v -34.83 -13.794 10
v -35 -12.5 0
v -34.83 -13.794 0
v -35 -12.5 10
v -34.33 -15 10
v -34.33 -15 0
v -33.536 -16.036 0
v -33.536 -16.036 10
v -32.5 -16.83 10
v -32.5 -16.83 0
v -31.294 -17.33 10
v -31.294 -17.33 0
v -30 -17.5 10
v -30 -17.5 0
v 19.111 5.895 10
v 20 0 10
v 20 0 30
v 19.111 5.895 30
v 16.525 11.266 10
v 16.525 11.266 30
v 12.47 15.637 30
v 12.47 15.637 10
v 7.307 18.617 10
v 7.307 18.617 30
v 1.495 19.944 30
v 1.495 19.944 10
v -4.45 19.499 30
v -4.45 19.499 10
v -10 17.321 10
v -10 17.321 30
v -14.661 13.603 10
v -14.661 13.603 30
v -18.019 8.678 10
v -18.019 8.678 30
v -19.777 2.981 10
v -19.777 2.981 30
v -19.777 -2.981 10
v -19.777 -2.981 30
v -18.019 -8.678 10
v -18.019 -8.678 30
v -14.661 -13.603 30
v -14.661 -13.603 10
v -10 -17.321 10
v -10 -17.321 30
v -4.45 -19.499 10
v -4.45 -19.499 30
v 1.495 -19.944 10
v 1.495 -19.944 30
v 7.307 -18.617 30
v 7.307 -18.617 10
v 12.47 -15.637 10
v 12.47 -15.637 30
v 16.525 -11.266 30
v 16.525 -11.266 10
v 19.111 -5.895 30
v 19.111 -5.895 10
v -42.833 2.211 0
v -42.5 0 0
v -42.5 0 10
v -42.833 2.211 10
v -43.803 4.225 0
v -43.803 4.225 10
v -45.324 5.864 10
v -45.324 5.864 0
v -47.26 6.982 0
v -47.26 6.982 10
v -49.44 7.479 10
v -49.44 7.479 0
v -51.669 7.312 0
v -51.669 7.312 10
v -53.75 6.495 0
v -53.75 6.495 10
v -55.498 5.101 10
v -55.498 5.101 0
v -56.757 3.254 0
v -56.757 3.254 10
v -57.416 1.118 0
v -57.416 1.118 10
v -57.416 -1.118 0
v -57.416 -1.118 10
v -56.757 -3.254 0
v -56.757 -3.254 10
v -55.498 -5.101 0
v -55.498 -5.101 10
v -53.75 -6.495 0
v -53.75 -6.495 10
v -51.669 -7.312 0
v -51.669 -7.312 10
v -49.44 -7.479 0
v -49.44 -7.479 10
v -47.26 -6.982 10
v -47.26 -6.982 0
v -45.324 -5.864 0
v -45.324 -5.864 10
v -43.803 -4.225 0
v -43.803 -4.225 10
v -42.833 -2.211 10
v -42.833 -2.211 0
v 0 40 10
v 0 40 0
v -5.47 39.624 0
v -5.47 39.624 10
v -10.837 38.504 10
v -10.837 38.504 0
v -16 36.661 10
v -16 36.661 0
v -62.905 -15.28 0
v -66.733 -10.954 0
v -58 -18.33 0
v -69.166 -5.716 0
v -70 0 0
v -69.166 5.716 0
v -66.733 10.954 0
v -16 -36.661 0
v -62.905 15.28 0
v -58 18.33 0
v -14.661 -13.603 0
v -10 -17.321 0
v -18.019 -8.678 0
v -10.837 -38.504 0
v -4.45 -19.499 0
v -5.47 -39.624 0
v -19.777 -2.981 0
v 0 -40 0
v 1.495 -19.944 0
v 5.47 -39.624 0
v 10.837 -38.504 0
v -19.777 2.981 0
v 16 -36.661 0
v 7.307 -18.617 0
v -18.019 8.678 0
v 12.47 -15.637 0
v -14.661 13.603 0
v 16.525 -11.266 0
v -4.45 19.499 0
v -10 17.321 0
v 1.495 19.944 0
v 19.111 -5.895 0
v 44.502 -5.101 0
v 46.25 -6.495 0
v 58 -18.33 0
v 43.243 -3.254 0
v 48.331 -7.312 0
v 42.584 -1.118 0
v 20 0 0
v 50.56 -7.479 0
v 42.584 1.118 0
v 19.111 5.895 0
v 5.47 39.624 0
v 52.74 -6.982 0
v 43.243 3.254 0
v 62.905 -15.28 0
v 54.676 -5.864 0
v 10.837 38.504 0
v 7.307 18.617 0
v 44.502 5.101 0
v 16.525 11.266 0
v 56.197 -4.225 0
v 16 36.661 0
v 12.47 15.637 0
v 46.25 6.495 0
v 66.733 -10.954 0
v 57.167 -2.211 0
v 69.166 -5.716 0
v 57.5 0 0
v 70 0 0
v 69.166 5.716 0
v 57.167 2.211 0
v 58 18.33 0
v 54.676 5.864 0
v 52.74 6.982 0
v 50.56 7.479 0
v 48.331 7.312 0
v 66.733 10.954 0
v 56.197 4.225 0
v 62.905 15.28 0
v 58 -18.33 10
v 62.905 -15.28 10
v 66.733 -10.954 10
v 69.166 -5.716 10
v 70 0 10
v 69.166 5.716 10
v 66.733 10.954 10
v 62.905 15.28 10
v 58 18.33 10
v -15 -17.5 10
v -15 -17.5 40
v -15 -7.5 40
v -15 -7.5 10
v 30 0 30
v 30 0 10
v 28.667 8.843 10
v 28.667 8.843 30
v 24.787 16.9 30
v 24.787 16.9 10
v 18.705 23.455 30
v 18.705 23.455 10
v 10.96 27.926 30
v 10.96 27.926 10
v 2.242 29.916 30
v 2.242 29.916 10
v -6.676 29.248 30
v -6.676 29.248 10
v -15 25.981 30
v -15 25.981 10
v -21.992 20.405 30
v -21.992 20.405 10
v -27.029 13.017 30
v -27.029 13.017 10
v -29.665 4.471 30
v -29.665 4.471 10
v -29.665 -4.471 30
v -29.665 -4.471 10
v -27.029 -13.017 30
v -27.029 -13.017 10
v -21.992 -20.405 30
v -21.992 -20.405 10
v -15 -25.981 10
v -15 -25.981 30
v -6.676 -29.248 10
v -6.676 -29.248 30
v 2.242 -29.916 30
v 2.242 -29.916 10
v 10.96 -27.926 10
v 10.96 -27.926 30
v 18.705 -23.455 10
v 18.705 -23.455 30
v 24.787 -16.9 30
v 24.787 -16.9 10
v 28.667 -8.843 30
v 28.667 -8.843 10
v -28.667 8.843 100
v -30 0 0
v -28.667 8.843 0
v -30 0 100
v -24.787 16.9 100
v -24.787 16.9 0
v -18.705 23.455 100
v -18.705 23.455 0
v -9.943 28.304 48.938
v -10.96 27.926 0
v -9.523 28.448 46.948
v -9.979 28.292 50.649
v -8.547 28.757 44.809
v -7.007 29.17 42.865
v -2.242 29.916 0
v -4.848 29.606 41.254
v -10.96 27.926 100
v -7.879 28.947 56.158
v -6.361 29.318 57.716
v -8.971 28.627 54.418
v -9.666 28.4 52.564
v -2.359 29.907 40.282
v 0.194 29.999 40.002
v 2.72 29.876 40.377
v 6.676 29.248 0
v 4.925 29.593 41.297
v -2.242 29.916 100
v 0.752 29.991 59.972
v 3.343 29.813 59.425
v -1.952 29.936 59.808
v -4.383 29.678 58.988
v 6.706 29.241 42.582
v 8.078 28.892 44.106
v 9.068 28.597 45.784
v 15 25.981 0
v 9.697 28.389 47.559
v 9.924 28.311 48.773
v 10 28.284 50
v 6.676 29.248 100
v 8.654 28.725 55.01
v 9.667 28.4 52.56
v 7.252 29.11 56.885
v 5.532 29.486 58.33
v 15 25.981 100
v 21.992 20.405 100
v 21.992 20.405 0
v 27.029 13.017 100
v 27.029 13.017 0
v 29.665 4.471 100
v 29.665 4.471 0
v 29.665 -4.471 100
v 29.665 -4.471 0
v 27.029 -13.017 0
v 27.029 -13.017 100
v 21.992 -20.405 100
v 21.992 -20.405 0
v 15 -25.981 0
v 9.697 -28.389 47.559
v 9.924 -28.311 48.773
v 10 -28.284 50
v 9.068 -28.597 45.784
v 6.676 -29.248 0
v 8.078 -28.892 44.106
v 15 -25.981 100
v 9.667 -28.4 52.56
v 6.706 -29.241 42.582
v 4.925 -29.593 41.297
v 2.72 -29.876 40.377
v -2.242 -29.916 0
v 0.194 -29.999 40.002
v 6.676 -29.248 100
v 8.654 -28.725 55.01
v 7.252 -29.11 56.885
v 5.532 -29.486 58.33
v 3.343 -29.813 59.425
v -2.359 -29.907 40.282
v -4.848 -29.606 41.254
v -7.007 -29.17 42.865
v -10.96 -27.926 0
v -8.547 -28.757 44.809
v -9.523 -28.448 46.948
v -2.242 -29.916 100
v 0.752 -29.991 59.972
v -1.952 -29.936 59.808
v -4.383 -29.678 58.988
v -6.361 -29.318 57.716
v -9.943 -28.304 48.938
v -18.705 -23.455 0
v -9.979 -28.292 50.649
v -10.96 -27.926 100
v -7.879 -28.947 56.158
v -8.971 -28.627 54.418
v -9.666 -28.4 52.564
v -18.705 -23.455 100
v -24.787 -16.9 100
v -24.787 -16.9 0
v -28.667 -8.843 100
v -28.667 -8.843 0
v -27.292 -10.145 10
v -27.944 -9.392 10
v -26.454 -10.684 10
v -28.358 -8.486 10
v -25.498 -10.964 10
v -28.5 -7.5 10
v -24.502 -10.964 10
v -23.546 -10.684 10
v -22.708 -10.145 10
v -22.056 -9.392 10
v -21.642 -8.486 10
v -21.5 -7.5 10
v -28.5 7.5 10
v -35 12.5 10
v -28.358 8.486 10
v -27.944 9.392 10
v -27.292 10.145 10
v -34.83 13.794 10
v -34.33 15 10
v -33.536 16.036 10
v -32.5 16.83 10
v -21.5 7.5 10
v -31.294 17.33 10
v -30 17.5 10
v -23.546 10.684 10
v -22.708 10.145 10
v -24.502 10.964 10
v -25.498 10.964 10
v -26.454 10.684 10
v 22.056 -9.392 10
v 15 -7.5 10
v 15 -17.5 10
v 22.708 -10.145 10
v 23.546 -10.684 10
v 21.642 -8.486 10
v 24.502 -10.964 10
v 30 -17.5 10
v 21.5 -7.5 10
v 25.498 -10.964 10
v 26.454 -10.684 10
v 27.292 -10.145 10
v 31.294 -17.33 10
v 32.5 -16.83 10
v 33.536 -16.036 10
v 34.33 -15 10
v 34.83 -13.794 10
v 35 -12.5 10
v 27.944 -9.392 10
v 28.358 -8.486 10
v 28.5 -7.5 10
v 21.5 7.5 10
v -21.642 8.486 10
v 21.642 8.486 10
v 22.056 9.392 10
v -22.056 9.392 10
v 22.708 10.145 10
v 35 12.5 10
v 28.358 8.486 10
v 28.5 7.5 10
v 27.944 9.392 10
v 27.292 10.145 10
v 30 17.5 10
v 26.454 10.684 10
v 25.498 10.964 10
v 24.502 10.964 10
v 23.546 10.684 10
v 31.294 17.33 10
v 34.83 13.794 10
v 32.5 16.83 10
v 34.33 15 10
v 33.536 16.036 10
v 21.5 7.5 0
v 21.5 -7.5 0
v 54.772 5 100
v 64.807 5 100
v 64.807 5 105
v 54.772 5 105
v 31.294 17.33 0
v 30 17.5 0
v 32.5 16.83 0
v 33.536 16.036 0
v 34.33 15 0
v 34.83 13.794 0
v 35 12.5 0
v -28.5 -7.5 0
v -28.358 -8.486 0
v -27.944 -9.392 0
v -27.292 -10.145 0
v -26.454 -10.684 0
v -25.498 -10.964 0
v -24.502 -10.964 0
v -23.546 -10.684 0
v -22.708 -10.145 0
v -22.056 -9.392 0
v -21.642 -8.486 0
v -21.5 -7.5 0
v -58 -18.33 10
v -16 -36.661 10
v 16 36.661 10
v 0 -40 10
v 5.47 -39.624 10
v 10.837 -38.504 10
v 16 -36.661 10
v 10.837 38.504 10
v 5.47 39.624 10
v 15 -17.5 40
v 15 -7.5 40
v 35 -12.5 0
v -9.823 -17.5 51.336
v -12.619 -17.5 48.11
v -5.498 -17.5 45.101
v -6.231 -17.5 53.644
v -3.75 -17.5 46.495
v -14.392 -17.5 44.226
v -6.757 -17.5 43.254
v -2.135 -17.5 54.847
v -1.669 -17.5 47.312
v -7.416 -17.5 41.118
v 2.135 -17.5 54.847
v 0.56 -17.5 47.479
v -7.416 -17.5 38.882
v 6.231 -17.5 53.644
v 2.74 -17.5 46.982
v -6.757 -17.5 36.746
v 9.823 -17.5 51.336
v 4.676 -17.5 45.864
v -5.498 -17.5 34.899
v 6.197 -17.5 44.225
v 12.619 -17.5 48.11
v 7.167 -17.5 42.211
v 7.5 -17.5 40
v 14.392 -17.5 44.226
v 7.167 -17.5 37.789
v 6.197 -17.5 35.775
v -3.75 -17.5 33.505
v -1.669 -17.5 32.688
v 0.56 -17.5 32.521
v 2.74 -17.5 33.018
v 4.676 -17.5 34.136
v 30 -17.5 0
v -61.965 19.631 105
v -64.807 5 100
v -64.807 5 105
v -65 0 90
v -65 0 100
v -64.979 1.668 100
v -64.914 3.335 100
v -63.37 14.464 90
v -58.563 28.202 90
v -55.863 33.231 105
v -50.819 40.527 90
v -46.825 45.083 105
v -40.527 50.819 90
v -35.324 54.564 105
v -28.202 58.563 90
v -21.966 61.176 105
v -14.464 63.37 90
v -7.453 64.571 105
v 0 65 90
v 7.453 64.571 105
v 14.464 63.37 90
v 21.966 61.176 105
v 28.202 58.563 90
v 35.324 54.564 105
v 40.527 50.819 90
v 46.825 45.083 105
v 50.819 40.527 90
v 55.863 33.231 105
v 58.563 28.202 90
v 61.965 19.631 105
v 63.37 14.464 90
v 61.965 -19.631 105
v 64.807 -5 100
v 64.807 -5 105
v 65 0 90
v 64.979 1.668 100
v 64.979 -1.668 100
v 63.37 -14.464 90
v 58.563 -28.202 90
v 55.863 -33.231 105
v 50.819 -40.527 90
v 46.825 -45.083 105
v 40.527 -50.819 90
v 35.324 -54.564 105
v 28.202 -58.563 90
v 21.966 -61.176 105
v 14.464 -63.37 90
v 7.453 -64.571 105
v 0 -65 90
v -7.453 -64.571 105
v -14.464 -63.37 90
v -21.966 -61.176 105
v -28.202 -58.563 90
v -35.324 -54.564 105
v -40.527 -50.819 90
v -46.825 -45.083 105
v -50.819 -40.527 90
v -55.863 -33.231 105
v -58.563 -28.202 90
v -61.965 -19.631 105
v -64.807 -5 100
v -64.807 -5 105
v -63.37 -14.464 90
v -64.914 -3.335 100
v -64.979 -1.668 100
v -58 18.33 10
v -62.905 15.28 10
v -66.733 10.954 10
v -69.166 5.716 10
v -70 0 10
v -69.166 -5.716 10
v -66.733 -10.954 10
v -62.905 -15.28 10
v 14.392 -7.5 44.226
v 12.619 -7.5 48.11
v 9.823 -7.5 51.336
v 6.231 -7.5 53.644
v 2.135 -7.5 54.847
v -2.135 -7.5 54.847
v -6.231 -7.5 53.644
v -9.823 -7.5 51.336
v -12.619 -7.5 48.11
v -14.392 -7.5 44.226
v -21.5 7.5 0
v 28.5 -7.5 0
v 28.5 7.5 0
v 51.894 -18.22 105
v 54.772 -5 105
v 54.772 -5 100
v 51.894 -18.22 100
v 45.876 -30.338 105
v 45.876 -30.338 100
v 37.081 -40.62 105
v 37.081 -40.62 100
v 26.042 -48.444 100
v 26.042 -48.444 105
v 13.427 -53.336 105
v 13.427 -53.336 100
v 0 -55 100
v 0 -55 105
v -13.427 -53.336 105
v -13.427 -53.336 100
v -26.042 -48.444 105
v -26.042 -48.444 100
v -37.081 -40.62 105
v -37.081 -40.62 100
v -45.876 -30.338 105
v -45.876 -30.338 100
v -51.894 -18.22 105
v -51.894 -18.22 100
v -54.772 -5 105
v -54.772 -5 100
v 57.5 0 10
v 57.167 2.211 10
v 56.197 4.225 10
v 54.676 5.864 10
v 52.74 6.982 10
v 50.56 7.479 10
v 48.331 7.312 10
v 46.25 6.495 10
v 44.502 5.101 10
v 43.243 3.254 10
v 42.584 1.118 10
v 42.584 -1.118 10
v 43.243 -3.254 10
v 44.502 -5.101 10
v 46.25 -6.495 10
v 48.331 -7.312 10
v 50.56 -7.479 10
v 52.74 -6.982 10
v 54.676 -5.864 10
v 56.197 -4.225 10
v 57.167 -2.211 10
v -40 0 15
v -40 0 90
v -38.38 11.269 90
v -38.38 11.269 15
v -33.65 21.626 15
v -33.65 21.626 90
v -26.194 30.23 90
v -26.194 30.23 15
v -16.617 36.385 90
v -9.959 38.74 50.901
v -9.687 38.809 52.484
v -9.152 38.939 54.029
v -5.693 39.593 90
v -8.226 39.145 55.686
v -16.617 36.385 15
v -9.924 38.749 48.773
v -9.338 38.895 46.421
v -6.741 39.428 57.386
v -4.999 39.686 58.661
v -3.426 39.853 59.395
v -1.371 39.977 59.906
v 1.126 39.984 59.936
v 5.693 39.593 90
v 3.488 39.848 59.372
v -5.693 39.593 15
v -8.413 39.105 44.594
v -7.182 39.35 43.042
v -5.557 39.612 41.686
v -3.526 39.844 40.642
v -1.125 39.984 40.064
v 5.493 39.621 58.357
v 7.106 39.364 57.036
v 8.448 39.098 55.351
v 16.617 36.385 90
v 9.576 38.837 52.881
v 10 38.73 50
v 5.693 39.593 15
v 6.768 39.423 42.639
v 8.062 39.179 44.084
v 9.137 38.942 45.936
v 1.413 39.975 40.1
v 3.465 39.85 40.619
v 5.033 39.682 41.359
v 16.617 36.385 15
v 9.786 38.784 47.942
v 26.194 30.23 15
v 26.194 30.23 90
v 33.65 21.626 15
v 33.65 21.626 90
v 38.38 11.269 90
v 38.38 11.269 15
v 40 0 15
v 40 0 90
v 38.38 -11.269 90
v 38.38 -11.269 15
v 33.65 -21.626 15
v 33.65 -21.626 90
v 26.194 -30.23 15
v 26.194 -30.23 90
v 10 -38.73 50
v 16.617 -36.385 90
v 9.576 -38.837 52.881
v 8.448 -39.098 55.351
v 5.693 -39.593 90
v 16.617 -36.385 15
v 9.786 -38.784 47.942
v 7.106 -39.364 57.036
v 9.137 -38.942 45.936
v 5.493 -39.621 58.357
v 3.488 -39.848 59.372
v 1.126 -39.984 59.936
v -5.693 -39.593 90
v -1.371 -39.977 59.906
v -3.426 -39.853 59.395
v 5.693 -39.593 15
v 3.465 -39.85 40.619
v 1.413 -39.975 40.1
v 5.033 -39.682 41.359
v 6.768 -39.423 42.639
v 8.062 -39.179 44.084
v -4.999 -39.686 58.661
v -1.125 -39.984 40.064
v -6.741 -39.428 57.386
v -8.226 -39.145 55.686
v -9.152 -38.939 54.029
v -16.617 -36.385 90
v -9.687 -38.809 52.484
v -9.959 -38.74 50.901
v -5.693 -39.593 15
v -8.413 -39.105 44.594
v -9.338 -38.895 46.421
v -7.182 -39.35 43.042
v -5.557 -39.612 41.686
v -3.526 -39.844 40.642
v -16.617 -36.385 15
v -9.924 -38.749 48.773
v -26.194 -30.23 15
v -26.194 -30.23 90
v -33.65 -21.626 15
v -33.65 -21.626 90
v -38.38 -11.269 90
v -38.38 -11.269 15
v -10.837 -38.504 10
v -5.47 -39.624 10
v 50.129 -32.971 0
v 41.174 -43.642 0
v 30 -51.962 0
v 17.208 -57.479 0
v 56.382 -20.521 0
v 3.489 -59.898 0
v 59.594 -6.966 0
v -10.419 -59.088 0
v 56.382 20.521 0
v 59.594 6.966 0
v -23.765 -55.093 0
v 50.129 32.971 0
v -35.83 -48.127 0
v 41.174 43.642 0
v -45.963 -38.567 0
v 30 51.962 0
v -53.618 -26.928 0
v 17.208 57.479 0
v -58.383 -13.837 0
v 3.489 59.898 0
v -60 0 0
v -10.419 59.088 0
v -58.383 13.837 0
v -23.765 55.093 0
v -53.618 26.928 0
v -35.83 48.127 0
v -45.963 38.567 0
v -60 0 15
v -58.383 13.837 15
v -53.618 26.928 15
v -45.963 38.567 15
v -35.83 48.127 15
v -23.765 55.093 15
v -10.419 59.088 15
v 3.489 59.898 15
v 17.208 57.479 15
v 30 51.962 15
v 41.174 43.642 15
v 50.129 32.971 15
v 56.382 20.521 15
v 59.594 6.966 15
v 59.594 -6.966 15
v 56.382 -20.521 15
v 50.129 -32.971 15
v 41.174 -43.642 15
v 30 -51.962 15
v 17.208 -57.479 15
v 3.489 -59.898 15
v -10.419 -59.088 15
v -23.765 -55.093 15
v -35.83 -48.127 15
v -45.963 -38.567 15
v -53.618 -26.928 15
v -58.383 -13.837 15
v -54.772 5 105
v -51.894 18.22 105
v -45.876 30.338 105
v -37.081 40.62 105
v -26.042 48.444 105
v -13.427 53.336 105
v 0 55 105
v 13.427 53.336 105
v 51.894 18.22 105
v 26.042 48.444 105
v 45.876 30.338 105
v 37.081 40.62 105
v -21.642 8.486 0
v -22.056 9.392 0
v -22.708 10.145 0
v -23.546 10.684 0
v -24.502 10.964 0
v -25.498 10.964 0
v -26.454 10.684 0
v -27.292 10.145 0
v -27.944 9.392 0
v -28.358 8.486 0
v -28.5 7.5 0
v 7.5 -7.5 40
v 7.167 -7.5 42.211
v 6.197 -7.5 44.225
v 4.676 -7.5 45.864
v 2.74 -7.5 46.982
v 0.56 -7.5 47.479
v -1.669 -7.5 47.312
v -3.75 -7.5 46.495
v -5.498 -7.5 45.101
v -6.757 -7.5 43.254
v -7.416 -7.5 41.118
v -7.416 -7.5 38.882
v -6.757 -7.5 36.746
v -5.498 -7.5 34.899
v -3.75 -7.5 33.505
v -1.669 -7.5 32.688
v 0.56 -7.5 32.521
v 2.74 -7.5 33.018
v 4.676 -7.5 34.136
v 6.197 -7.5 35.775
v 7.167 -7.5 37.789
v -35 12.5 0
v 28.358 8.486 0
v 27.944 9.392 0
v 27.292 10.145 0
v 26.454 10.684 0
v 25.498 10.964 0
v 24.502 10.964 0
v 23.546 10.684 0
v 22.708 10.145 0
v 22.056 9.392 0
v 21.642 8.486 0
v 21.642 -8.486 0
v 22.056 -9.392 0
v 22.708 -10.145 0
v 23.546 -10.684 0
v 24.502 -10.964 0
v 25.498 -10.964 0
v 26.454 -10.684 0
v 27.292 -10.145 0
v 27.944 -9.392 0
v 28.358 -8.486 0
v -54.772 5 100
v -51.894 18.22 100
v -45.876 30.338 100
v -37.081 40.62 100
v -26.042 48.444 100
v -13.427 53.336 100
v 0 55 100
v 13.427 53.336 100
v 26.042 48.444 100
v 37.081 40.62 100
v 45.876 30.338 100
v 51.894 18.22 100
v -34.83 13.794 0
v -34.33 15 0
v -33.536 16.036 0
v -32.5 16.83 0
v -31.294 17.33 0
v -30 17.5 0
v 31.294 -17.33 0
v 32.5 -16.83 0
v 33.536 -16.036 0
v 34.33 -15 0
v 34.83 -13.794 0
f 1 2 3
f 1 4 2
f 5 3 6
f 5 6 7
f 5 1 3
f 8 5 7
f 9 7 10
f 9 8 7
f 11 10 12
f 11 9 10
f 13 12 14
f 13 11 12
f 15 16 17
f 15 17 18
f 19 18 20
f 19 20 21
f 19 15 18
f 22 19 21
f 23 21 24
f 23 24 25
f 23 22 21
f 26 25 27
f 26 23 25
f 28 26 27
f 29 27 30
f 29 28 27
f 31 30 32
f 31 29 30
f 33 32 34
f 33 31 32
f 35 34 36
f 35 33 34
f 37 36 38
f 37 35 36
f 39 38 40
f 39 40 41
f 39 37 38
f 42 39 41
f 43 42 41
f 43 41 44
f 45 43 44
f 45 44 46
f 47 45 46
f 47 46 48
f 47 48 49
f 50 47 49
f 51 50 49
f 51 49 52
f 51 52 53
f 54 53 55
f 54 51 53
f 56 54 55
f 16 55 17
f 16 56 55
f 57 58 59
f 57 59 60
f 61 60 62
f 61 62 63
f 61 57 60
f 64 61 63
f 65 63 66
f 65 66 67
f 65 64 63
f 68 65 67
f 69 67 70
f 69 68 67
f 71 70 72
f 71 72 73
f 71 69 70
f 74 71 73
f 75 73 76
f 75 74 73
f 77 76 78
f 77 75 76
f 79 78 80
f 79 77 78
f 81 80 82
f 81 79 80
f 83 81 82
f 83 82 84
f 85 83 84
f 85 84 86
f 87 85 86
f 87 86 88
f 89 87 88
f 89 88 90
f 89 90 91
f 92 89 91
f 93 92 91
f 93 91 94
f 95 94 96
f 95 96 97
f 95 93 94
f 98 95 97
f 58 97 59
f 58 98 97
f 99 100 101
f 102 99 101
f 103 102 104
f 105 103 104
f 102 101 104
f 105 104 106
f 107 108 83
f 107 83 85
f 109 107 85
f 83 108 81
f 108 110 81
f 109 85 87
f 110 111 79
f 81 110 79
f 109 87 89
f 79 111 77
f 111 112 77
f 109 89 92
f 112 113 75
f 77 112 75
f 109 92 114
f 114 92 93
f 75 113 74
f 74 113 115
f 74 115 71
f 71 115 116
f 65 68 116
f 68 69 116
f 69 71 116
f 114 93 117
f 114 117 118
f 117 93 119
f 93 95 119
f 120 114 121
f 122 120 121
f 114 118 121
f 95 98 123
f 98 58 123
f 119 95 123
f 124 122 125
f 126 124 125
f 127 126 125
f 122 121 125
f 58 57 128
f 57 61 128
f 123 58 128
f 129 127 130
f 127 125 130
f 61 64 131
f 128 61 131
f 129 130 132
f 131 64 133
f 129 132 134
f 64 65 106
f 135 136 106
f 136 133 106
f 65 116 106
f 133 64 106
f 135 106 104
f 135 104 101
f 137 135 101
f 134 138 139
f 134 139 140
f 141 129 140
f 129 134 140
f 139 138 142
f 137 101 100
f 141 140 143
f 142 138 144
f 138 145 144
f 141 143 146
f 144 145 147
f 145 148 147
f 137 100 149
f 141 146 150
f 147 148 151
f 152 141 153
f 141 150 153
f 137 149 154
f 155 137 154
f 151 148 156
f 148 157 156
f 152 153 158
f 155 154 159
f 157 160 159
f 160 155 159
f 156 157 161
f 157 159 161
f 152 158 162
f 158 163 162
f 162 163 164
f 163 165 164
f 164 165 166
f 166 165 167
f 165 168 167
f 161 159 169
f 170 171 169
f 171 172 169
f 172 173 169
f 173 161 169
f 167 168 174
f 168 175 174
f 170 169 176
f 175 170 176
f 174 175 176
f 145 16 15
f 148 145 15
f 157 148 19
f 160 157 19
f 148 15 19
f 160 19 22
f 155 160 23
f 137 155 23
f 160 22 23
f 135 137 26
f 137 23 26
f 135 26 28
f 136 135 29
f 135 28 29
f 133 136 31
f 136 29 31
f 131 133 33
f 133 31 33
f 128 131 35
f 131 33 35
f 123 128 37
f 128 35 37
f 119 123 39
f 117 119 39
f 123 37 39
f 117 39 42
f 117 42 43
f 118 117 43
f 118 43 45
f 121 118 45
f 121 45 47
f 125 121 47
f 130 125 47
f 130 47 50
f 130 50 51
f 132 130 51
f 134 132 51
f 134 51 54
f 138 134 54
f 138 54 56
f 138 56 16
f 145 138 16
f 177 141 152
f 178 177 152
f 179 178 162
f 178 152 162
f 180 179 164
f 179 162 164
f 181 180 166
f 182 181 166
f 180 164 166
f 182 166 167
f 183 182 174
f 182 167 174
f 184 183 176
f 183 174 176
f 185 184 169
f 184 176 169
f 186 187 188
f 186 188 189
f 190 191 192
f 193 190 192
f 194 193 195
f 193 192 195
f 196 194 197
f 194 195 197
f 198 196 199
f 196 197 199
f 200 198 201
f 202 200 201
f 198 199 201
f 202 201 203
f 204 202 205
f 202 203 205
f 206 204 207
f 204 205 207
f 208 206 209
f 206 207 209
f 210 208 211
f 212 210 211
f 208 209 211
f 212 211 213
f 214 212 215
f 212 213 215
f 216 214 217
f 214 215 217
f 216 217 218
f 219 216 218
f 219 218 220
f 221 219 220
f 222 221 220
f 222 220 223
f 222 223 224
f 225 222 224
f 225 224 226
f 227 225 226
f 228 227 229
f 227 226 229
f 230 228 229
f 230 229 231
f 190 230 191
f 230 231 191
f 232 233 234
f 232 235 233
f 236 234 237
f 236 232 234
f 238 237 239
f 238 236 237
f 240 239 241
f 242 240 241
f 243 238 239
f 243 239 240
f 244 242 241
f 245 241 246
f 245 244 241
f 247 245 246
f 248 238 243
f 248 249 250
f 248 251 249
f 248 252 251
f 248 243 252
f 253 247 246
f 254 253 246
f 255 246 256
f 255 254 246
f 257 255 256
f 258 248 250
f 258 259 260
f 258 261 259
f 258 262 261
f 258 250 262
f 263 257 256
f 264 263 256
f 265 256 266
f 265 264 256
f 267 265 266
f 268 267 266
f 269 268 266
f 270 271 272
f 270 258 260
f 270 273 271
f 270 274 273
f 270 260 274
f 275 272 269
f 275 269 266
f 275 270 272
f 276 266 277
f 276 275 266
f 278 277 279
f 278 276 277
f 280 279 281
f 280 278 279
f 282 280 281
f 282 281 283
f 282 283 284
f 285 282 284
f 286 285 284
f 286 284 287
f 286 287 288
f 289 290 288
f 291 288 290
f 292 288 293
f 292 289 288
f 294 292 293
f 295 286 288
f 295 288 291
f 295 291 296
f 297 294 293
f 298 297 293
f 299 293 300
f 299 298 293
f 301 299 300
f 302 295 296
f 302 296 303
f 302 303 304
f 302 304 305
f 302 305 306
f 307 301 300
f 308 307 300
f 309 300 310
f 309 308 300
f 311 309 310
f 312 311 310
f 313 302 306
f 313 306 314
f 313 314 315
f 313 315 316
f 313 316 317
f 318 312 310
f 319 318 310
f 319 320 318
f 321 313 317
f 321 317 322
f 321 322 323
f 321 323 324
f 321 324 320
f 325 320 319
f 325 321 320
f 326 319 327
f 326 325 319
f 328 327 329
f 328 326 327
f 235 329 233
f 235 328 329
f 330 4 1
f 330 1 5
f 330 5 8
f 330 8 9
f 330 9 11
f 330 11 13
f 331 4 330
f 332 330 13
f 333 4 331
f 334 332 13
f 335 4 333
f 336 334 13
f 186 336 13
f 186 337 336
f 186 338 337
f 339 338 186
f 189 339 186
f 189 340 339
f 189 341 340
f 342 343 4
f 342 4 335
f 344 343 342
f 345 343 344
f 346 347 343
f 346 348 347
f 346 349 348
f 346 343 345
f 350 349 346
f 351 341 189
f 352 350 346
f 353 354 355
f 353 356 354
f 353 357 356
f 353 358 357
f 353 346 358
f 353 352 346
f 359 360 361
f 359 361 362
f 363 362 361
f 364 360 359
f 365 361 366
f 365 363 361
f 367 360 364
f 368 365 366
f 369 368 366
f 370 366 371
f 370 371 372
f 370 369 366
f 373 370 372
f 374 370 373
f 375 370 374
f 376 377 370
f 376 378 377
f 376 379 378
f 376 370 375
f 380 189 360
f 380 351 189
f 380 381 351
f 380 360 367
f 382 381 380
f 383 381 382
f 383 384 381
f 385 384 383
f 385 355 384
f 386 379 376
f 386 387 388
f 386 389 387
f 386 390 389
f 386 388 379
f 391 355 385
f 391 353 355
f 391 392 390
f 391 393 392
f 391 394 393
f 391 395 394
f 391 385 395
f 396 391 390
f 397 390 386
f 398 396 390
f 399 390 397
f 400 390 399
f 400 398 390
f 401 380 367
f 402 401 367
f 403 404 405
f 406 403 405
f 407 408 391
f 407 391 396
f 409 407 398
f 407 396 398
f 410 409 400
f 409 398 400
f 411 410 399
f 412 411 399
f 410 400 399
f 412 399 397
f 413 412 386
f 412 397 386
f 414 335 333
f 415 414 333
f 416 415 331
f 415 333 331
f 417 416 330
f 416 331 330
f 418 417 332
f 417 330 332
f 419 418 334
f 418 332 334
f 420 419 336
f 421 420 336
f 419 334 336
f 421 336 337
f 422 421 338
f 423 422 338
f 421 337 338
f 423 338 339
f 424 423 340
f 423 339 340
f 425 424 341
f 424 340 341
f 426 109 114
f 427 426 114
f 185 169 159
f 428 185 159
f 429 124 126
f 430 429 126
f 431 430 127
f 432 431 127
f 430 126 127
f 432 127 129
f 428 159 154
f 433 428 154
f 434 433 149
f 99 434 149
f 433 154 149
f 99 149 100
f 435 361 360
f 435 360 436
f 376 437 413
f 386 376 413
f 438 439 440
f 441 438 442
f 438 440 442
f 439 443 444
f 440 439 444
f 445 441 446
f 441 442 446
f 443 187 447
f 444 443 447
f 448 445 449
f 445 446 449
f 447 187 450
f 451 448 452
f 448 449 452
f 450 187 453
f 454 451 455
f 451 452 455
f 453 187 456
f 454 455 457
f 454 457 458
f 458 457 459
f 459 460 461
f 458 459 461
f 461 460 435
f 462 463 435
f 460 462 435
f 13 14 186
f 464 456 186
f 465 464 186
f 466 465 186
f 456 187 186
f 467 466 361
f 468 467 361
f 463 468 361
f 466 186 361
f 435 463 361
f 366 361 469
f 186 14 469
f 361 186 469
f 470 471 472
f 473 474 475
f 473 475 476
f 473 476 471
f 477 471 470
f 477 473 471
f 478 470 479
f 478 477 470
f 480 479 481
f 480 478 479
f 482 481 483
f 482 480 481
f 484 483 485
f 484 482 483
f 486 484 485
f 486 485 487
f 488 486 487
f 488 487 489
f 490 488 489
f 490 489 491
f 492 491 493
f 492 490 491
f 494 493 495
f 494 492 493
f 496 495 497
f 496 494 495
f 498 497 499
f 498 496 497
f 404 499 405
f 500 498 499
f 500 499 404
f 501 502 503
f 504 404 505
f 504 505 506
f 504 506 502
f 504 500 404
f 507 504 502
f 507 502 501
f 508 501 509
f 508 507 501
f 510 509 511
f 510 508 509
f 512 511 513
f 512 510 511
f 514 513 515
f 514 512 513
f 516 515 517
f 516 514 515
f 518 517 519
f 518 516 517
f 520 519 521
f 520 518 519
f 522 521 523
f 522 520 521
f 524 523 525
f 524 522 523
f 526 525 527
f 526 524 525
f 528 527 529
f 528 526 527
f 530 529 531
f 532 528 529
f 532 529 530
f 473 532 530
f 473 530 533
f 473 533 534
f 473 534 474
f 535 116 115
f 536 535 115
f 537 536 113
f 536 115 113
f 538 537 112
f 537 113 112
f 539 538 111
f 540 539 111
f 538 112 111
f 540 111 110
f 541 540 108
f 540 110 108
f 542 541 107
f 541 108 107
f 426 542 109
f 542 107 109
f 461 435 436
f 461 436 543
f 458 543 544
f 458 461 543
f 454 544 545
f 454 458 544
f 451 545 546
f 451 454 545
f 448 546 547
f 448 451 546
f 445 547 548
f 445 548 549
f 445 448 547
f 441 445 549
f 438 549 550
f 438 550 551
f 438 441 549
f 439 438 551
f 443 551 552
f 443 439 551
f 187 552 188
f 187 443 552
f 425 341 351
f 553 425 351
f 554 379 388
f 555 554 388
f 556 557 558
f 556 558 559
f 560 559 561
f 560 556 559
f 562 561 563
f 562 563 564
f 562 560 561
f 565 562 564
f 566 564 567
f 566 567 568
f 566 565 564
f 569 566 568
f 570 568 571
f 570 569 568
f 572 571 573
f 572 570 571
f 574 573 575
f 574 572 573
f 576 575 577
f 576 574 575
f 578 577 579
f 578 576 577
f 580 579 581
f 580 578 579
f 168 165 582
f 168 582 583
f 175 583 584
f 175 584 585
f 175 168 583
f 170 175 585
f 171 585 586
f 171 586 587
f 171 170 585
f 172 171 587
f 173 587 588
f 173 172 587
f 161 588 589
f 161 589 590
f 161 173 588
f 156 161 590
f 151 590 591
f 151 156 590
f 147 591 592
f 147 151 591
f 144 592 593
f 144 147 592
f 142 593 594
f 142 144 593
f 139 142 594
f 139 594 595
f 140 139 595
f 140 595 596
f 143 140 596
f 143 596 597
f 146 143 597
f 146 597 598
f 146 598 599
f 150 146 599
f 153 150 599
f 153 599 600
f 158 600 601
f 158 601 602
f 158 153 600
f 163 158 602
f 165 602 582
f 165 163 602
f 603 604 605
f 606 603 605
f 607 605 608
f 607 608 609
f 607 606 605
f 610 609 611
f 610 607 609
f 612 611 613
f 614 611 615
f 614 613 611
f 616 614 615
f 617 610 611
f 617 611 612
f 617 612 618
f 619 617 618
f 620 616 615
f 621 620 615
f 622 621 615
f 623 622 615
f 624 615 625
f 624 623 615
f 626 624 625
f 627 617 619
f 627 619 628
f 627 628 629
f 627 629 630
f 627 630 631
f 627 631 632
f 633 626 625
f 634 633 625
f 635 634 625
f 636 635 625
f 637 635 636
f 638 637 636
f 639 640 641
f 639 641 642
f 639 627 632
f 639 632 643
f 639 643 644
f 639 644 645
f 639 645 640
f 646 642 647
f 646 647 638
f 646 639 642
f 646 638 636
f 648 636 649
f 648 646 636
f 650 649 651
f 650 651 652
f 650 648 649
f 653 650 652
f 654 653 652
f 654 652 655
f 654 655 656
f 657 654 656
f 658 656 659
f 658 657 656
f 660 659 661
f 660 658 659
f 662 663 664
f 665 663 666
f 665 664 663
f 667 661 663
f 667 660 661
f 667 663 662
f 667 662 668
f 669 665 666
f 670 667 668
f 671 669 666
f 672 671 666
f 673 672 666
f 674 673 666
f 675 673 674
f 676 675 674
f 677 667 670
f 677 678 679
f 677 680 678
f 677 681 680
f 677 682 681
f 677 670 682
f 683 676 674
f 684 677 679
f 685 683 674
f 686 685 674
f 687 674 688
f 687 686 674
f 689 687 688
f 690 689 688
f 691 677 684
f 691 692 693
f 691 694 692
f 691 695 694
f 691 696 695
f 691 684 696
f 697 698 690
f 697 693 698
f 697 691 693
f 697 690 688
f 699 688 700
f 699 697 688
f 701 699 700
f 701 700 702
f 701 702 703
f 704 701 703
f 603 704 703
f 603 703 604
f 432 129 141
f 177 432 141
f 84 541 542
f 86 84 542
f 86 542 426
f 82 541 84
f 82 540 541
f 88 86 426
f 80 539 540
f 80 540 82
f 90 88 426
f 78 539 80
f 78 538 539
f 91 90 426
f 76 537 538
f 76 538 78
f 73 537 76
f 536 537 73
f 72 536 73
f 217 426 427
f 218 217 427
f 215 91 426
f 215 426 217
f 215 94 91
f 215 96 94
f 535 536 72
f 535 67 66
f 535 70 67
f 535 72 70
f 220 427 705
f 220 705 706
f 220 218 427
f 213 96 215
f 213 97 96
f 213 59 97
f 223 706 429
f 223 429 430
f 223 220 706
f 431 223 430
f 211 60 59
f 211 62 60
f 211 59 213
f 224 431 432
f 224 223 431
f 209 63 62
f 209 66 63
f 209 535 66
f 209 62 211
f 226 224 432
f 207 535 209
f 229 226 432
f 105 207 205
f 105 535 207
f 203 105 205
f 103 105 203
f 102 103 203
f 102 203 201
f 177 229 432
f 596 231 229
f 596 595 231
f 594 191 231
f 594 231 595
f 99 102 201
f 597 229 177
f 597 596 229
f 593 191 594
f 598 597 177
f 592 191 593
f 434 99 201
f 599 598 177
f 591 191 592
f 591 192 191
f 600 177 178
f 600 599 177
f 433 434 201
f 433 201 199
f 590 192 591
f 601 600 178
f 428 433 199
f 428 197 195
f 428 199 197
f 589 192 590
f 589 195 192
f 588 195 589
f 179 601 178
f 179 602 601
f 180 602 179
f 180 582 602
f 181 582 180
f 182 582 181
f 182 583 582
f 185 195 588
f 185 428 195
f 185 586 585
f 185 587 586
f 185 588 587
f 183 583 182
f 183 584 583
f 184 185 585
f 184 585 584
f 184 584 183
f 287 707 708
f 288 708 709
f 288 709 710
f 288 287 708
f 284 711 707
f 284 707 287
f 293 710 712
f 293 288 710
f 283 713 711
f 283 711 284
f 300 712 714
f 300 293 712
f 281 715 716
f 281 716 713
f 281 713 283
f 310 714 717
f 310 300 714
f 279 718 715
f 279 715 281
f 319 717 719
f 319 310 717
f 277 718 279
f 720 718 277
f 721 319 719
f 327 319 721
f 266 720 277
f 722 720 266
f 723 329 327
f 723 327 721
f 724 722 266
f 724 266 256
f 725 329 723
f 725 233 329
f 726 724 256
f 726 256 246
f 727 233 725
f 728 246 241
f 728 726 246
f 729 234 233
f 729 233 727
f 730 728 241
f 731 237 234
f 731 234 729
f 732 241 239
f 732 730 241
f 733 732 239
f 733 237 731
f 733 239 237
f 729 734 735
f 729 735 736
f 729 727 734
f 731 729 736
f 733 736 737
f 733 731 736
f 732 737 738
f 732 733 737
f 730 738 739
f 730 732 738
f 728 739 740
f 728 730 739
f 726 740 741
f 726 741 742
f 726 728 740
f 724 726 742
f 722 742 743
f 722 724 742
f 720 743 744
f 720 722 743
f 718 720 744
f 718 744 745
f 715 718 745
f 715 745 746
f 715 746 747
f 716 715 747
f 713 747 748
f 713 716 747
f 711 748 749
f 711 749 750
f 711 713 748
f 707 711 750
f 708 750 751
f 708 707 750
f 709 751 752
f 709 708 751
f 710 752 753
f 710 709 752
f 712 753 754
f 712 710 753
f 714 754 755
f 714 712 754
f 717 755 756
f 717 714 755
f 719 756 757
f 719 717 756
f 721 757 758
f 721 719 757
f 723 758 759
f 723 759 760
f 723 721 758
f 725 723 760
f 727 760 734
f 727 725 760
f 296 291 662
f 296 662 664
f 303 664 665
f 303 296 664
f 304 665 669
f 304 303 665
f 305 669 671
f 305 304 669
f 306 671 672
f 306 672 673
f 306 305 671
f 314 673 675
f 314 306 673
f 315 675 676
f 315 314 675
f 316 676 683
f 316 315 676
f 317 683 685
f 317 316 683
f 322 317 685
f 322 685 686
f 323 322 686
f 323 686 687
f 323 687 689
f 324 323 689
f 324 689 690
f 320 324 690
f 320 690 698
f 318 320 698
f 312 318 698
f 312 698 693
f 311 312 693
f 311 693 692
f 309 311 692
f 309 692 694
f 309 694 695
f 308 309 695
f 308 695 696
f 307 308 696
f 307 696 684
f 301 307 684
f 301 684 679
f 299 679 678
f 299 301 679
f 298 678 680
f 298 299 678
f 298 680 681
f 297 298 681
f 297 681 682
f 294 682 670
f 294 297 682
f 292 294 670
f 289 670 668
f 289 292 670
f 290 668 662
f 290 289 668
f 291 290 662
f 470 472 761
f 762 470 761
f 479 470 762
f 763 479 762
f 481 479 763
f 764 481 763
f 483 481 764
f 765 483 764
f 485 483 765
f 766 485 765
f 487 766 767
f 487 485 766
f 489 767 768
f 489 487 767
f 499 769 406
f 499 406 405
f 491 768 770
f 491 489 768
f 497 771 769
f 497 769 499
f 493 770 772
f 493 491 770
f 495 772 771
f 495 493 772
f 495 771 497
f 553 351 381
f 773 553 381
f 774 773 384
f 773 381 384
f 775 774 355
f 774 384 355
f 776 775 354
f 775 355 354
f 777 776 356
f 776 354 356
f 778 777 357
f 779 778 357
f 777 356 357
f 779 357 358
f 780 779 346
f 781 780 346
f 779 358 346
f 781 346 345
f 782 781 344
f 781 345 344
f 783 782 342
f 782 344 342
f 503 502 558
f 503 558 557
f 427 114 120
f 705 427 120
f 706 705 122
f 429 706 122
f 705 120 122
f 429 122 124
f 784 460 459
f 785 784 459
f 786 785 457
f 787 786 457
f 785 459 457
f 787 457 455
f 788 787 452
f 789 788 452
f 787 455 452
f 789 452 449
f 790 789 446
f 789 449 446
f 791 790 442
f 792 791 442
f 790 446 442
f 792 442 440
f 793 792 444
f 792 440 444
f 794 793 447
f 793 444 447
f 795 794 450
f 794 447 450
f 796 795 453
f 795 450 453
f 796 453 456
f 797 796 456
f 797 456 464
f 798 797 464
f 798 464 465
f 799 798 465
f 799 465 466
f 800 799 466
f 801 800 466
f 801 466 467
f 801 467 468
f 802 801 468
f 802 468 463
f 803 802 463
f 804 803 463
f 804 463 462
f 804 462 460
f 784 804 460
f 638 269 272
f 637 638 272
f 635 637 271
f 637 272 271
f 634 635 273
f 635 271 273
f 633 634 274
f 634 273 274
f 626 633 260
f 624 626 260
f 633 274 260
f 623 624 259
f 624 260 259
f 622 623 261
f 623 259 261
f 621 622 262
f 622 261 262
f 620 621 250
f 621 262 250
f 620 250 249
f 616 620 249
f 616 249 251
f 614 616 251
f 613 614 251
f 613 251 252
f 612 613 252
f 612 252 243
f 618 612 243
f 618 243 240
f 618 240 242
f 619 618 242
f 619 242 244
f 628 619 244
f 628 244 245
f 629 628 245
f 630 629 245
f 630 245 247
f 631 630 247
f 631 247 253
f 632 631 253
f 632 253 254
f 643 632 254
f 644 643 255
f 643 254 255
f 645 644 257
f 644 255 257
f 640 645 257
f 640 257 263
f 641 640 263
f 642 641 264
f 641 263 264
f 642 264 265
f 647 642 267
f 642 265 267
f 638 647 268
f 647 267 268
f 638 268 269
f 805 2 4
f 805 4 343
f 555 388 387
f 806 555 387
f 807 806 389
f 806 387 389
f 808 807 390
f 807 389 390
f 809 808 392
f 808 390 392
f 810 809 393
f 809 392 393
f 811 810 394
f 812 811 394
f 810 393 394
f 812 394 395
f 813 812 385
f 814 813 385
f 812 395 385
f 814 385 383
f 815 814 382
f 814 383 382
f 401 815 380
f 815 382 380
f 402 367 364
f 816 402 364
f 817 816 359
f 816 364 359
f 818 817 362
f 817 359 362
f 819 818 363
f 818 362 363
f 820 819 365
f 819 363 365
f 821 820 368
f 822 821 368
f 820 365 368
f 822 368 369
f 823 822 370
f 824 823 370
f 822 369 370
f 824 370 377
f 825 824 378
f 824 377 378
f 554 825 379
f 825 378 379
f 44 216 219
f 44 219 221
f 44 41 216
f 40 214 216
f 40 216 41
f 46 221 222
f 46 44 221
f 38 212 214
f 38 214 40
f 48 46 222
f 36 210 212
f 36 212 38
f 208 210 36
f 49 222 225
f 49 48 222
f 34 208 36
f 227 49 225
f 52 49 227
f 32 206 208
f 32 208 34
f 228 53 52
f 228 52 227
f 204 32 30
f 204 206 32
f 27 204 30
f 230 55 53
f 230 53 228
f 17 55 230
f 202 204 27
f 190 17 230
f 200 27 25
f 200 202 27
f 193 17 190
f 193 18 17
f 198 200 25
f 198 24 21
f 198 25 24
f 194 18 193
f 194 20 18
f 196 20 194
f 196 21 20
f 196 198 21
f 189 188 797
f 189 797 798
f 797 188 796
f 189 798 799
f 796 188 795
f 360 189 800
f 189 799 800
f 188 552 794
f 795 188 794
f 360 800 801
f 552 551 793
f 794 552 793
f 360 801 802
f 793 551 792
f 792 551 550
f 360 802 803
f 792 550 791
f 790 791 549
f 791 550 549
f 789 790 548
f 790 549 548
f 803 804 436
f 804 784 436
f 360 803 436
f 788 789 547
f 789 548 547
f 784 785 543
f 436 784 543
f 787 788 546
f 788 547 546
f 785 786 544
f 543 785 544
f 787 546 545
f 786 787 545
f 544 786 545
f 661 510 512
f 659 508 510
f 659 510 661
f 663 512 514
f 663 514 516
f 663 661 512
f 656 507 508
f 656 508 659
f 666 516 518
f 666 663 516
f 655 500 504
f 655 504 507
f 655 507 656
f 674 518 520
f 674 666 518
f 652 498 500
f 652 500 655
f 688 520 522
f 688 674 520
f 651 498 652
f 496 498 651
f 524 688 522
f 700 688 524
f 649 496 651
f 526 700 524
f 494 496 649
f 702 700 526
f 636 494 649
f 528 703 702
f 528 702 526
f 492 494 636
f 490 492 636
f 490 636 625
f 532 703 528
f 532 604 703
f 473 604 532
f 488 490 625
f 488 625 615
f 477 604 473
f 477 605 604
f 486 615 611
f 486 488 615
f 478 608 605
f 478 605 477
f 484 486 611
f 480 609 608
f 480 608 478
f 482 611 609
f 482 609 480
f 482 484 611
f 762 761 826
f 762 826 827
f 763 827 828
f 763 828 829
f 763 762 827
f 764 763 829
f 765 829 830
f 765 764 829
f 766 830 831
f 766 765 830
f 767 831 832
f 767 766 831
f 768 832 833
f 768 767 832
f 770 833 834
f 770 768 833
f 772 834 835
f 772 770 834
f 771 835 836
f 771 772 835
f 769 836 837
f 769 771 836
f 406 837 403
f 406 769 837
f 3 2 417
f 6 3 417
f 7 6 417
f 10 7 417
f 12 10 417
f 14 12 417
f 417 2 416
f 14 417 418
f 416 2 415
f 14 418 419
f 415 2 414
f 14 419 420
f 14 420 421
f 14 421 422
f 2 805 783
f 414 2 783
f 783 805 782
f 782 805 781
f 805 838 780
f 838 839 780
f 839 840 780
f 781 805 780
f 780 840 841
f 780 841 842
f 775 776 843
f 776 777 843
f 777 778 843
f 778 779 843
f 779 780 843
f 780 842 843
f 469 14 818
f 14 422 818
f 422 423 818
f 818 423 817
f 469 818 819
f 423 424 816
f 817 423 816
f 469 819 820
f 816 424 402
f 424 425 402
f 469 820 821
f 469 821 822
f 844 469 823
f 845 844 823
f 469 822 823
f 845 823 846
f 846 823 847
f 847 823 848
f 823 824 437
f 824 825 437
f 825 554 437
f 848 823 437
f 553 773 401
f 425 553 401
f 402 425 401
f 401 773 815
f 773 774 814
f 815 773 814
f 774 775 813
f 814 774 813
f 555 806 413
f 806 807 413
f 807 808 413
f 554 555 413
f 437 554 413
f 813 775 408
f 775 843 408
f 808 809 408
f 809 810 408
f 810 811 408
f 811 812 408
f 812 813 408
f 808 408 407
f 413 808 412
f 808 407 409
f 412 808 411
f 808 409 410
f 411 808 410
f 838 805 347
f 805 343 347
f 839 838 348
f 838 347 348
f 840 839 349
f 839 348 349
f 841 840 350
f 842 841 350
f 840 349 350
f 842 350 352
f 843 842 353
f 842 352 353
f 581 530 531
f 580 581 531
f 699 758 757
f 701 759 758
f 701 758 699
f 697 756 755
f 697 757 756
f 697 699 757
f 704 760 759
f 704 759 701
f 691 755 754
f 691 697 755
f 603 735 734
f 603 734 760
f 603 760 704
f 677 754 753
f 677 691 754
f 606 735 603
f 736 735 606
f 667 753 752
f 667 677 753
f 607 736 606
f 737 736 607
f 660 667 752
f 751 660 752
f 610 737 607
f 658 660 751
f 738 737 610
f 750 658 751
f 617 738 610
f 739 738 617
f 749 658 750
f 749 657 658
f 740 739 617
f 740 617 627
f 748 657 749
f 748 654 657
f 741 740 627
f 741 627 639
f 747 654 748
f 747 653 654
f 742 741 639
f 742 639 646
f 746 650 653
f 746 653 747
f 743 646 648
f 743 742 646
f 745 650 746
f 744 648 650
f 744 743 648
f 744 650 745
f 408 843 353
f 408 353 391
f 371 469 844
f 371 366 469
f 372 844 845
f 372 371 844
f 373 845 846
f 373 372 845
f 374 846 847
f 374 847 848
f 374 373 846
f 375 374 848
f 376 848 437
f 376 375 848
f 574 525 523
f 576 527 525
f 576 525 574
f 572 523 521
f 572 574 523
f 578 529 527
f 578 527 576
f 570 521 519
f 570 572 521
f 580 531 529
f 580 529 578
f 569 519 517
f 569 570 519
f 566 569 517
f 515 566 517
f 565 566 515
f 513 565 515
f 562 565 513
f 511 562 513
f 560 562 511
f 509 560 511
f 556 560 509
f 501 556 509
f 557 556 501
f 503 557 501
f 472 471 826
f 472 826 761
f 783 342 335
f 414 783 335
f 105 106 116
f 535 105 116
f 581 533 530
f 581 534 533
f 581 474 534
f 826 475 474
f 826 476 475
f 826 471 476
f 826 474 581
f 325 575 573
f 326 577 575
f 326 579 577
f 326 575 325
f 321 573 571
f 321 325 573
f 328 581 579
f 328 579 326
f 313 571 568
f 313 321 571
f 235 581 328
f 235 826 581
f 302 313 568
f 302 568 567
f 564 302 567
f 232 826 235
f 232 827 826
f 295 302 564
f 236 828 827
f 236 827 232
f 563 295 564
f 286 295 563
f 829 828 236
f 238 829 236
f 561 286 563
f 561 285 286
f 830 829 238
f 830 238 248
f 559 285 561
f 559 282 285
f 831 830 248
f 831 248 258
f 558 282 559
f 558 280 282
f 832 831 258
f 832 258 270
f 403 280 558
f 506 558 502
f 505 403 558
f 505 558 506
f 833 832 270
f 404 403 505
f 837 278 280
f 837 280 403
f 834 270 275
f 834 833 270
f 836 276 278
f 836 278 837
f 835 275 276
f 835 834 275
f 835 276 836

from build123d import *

# Parameters (mm, degrees)
F0_W           = 70
F0_H           = 35
F1_DEPTH       = 10
F3_DEPTH       = 10
F4_R           = 5
F5_R           = 7.5
F6_DEPTH       = 25
F8_DEPTH       = 10.001
F11_R          = 10
F12_DEPTH      = 65.001
F12_DEPTH_BACK = 65.001
F13_W          = 10
F13_H          = 5
F14_DEPTH      = 65.001
F14_DEPTH_BACK = 65.001
F15_R          = 7.5
F16_DEPTH      = 10
F17_R          = 30
F17_R_2        = 20
F18_DEPTH      = 20
F19_DEPTH      = 10.0010001


with BuildPart() as f1:
    # F0 (on Top) → F1 (new body)
    with BuildSketch(Plane.XY):
        Rectangle(F0_W, F0_H)
    extrude(amount=F1_DEPTH)

    # F2 (on face) → F3 (join)
    with BuildSketch(Plane.XZ.offset(17.5)):
        with BuildLine():
            Line((-15, 40), (-15, 10))
            Line((-15, 10), (15, 10))
            Line((15, 10), (15, 40))
            ThreePointArc((15, 40), (0, 55), (-15, 40))
        make_face()
    extrude(amount=-F3_DEPTH)

    # F4
    f4_edges = [f1.edges().sort_by_distance(p)[0] for p in [
        (-35, -17.5, 5),
        (35, -17.5, 5),
        (35, 17.5, 5),
        (-35, 17.5, 5),
    ]]
    fillet(f4_edges, radius=F4_R)

    # F5 (on face) → F6 (cut)
    with BuildSketch(Plane.XZ.offset(17.5)):
        with Locations((0, 40)):
            Circle(F5_R)
    extrude(amount=-F6_DEPTH, mode=Mode.SUBTRACT)

    # F7 (on face) → F8 (cut, through all)
    with BuildSketch(Plane.XY.offset(10)):
        with BuildLine():
            ThreePointArc((21.5, -7.5), (25, -11), (28.5, -7.5))
            Line((28.5, -7.5), (28.5, 7.5))
            ThreePointArc((28.5, 7.5), (25, 11), (21.5, 7.5))
            Line((21.5, 7.5), (21.5, -7.5))
        make_face()
        with BuildLine():
            Line((-28.5, 7.5), (-28.5, -7.5))
            ThreePointArc((-28.5, -7.5), (-25, -11), (-21.5, -7.5))
            Line((-21.5, -7.5), (-21.5, 7.5))
            ThreePointArc((-21.5, 7.5), (-25, 11), (-28.5, 7.5))
        make_face()
    extrude(amount=-F8_DEPTH, mode=Mode.SUBTRACT)


with BuildPart() as f10:
    # F9 (on Front) → F10 (revolve)
    with BuildSketch(Plane.XZ):
        Polygon((-60, 15), (-60, 0), (-30, 0), (-30, 100), (-55, 100), (-55, 105), (-65, 105), (-65, 90), (-40, 90), (-40, 15), align=None)
    revolve(axis=Axis((0, 0, 5.9435109548), (0, 0, -1)))

    # F11 (on Front) → F12 (cut, two sides)
    with BuildSketch(Plane.XZ) as f12_sk:
        with Locations((0, 50)):
            Circle(F11_R)
    extrude(amount=-F12_DEPTH, mode=Mode.SUBTRACT)
    extrude(f12_sk.sketch, amount=F12_DEPTH_BACK, mode=Mode.SUBTRACT)

    # F13 (on Right) → F14 (cut, two sides)
    with BuildSketch(Plane.YZ) as f14_sk:
        with Locations((0, 102.5)):
            Rectangle(F13_W, F13_H)
    extrude(amount=-F14_DEPTH, mode=Mode.SUBTRACT)
    extrude(f14_sk.sketch, amount=F14_DEPTH_BACK, mode=Mode.SUBTRACT)


with BuildPart() as f16:
    # F15 (on Top) → F16 (new body)
    with BuildSketch(Plane.XY):
        with BuildLine():
            ThreePointArc((16, 36.6606055596), (8.1723857476, 39.1562525172), (0, 40))
            ThreePointArc((0, 40), (-8.1723857476, 39.1562525172), (-16, 36.6606055596))
            Line((-16, 36.6606055596), (-58, 18.3303027798))
            ThreePointArc((-58, 18.3303027798), (-70, 0), (-58, -18.3303027798))
            Line((-58, -18.3303027798), (-16, -36.6606055596))
            ThreePointArc((-16, -36.6606055596), (-8.1723857476, -39.1562525172), (0, -40))
            ThreePointArc((0, -40), (8.1723857476, -39.1562525172), (16, -36.6606055596))
            Line((16, -36.6606055596), (58, -18.3303027798))
            ThreePointArc((58, -18.3303027798), (70, 0), (58, 18.3303027798))
            Line((58, 18.3303027798), (16, 36.6606055596))
        make_face()
        with Locations((-50, 0)):
            Circle(F15_R, mode=Mode.SUBTRACT)
        with Locations((50, 0)):
            Circle(F15_R, mode=Mode.SUBTRACT)
    extrude(amount=F16_DEPTH)

    # F17 (on face) → F18 (join)
    with BuildSketch(Plane.XY.offset(10)):
        Circle(F17_R)
        Circle(F17_R_2, mode=Mode.SUBTRACT)
    extrude(amount=F18_DEPTH)

    # F19 (cut, through all): a face of the model
    f19_faces = [f16.faces().sort_by_distance(p)[0] for p in [
        (0, 0, 10),
    ]]
    extrude(f19_faces, amount=-F19_DEPTH, mode=Mode.SUBTRACT)


solid = Compound([f1.part, f10.part, f16.part])
